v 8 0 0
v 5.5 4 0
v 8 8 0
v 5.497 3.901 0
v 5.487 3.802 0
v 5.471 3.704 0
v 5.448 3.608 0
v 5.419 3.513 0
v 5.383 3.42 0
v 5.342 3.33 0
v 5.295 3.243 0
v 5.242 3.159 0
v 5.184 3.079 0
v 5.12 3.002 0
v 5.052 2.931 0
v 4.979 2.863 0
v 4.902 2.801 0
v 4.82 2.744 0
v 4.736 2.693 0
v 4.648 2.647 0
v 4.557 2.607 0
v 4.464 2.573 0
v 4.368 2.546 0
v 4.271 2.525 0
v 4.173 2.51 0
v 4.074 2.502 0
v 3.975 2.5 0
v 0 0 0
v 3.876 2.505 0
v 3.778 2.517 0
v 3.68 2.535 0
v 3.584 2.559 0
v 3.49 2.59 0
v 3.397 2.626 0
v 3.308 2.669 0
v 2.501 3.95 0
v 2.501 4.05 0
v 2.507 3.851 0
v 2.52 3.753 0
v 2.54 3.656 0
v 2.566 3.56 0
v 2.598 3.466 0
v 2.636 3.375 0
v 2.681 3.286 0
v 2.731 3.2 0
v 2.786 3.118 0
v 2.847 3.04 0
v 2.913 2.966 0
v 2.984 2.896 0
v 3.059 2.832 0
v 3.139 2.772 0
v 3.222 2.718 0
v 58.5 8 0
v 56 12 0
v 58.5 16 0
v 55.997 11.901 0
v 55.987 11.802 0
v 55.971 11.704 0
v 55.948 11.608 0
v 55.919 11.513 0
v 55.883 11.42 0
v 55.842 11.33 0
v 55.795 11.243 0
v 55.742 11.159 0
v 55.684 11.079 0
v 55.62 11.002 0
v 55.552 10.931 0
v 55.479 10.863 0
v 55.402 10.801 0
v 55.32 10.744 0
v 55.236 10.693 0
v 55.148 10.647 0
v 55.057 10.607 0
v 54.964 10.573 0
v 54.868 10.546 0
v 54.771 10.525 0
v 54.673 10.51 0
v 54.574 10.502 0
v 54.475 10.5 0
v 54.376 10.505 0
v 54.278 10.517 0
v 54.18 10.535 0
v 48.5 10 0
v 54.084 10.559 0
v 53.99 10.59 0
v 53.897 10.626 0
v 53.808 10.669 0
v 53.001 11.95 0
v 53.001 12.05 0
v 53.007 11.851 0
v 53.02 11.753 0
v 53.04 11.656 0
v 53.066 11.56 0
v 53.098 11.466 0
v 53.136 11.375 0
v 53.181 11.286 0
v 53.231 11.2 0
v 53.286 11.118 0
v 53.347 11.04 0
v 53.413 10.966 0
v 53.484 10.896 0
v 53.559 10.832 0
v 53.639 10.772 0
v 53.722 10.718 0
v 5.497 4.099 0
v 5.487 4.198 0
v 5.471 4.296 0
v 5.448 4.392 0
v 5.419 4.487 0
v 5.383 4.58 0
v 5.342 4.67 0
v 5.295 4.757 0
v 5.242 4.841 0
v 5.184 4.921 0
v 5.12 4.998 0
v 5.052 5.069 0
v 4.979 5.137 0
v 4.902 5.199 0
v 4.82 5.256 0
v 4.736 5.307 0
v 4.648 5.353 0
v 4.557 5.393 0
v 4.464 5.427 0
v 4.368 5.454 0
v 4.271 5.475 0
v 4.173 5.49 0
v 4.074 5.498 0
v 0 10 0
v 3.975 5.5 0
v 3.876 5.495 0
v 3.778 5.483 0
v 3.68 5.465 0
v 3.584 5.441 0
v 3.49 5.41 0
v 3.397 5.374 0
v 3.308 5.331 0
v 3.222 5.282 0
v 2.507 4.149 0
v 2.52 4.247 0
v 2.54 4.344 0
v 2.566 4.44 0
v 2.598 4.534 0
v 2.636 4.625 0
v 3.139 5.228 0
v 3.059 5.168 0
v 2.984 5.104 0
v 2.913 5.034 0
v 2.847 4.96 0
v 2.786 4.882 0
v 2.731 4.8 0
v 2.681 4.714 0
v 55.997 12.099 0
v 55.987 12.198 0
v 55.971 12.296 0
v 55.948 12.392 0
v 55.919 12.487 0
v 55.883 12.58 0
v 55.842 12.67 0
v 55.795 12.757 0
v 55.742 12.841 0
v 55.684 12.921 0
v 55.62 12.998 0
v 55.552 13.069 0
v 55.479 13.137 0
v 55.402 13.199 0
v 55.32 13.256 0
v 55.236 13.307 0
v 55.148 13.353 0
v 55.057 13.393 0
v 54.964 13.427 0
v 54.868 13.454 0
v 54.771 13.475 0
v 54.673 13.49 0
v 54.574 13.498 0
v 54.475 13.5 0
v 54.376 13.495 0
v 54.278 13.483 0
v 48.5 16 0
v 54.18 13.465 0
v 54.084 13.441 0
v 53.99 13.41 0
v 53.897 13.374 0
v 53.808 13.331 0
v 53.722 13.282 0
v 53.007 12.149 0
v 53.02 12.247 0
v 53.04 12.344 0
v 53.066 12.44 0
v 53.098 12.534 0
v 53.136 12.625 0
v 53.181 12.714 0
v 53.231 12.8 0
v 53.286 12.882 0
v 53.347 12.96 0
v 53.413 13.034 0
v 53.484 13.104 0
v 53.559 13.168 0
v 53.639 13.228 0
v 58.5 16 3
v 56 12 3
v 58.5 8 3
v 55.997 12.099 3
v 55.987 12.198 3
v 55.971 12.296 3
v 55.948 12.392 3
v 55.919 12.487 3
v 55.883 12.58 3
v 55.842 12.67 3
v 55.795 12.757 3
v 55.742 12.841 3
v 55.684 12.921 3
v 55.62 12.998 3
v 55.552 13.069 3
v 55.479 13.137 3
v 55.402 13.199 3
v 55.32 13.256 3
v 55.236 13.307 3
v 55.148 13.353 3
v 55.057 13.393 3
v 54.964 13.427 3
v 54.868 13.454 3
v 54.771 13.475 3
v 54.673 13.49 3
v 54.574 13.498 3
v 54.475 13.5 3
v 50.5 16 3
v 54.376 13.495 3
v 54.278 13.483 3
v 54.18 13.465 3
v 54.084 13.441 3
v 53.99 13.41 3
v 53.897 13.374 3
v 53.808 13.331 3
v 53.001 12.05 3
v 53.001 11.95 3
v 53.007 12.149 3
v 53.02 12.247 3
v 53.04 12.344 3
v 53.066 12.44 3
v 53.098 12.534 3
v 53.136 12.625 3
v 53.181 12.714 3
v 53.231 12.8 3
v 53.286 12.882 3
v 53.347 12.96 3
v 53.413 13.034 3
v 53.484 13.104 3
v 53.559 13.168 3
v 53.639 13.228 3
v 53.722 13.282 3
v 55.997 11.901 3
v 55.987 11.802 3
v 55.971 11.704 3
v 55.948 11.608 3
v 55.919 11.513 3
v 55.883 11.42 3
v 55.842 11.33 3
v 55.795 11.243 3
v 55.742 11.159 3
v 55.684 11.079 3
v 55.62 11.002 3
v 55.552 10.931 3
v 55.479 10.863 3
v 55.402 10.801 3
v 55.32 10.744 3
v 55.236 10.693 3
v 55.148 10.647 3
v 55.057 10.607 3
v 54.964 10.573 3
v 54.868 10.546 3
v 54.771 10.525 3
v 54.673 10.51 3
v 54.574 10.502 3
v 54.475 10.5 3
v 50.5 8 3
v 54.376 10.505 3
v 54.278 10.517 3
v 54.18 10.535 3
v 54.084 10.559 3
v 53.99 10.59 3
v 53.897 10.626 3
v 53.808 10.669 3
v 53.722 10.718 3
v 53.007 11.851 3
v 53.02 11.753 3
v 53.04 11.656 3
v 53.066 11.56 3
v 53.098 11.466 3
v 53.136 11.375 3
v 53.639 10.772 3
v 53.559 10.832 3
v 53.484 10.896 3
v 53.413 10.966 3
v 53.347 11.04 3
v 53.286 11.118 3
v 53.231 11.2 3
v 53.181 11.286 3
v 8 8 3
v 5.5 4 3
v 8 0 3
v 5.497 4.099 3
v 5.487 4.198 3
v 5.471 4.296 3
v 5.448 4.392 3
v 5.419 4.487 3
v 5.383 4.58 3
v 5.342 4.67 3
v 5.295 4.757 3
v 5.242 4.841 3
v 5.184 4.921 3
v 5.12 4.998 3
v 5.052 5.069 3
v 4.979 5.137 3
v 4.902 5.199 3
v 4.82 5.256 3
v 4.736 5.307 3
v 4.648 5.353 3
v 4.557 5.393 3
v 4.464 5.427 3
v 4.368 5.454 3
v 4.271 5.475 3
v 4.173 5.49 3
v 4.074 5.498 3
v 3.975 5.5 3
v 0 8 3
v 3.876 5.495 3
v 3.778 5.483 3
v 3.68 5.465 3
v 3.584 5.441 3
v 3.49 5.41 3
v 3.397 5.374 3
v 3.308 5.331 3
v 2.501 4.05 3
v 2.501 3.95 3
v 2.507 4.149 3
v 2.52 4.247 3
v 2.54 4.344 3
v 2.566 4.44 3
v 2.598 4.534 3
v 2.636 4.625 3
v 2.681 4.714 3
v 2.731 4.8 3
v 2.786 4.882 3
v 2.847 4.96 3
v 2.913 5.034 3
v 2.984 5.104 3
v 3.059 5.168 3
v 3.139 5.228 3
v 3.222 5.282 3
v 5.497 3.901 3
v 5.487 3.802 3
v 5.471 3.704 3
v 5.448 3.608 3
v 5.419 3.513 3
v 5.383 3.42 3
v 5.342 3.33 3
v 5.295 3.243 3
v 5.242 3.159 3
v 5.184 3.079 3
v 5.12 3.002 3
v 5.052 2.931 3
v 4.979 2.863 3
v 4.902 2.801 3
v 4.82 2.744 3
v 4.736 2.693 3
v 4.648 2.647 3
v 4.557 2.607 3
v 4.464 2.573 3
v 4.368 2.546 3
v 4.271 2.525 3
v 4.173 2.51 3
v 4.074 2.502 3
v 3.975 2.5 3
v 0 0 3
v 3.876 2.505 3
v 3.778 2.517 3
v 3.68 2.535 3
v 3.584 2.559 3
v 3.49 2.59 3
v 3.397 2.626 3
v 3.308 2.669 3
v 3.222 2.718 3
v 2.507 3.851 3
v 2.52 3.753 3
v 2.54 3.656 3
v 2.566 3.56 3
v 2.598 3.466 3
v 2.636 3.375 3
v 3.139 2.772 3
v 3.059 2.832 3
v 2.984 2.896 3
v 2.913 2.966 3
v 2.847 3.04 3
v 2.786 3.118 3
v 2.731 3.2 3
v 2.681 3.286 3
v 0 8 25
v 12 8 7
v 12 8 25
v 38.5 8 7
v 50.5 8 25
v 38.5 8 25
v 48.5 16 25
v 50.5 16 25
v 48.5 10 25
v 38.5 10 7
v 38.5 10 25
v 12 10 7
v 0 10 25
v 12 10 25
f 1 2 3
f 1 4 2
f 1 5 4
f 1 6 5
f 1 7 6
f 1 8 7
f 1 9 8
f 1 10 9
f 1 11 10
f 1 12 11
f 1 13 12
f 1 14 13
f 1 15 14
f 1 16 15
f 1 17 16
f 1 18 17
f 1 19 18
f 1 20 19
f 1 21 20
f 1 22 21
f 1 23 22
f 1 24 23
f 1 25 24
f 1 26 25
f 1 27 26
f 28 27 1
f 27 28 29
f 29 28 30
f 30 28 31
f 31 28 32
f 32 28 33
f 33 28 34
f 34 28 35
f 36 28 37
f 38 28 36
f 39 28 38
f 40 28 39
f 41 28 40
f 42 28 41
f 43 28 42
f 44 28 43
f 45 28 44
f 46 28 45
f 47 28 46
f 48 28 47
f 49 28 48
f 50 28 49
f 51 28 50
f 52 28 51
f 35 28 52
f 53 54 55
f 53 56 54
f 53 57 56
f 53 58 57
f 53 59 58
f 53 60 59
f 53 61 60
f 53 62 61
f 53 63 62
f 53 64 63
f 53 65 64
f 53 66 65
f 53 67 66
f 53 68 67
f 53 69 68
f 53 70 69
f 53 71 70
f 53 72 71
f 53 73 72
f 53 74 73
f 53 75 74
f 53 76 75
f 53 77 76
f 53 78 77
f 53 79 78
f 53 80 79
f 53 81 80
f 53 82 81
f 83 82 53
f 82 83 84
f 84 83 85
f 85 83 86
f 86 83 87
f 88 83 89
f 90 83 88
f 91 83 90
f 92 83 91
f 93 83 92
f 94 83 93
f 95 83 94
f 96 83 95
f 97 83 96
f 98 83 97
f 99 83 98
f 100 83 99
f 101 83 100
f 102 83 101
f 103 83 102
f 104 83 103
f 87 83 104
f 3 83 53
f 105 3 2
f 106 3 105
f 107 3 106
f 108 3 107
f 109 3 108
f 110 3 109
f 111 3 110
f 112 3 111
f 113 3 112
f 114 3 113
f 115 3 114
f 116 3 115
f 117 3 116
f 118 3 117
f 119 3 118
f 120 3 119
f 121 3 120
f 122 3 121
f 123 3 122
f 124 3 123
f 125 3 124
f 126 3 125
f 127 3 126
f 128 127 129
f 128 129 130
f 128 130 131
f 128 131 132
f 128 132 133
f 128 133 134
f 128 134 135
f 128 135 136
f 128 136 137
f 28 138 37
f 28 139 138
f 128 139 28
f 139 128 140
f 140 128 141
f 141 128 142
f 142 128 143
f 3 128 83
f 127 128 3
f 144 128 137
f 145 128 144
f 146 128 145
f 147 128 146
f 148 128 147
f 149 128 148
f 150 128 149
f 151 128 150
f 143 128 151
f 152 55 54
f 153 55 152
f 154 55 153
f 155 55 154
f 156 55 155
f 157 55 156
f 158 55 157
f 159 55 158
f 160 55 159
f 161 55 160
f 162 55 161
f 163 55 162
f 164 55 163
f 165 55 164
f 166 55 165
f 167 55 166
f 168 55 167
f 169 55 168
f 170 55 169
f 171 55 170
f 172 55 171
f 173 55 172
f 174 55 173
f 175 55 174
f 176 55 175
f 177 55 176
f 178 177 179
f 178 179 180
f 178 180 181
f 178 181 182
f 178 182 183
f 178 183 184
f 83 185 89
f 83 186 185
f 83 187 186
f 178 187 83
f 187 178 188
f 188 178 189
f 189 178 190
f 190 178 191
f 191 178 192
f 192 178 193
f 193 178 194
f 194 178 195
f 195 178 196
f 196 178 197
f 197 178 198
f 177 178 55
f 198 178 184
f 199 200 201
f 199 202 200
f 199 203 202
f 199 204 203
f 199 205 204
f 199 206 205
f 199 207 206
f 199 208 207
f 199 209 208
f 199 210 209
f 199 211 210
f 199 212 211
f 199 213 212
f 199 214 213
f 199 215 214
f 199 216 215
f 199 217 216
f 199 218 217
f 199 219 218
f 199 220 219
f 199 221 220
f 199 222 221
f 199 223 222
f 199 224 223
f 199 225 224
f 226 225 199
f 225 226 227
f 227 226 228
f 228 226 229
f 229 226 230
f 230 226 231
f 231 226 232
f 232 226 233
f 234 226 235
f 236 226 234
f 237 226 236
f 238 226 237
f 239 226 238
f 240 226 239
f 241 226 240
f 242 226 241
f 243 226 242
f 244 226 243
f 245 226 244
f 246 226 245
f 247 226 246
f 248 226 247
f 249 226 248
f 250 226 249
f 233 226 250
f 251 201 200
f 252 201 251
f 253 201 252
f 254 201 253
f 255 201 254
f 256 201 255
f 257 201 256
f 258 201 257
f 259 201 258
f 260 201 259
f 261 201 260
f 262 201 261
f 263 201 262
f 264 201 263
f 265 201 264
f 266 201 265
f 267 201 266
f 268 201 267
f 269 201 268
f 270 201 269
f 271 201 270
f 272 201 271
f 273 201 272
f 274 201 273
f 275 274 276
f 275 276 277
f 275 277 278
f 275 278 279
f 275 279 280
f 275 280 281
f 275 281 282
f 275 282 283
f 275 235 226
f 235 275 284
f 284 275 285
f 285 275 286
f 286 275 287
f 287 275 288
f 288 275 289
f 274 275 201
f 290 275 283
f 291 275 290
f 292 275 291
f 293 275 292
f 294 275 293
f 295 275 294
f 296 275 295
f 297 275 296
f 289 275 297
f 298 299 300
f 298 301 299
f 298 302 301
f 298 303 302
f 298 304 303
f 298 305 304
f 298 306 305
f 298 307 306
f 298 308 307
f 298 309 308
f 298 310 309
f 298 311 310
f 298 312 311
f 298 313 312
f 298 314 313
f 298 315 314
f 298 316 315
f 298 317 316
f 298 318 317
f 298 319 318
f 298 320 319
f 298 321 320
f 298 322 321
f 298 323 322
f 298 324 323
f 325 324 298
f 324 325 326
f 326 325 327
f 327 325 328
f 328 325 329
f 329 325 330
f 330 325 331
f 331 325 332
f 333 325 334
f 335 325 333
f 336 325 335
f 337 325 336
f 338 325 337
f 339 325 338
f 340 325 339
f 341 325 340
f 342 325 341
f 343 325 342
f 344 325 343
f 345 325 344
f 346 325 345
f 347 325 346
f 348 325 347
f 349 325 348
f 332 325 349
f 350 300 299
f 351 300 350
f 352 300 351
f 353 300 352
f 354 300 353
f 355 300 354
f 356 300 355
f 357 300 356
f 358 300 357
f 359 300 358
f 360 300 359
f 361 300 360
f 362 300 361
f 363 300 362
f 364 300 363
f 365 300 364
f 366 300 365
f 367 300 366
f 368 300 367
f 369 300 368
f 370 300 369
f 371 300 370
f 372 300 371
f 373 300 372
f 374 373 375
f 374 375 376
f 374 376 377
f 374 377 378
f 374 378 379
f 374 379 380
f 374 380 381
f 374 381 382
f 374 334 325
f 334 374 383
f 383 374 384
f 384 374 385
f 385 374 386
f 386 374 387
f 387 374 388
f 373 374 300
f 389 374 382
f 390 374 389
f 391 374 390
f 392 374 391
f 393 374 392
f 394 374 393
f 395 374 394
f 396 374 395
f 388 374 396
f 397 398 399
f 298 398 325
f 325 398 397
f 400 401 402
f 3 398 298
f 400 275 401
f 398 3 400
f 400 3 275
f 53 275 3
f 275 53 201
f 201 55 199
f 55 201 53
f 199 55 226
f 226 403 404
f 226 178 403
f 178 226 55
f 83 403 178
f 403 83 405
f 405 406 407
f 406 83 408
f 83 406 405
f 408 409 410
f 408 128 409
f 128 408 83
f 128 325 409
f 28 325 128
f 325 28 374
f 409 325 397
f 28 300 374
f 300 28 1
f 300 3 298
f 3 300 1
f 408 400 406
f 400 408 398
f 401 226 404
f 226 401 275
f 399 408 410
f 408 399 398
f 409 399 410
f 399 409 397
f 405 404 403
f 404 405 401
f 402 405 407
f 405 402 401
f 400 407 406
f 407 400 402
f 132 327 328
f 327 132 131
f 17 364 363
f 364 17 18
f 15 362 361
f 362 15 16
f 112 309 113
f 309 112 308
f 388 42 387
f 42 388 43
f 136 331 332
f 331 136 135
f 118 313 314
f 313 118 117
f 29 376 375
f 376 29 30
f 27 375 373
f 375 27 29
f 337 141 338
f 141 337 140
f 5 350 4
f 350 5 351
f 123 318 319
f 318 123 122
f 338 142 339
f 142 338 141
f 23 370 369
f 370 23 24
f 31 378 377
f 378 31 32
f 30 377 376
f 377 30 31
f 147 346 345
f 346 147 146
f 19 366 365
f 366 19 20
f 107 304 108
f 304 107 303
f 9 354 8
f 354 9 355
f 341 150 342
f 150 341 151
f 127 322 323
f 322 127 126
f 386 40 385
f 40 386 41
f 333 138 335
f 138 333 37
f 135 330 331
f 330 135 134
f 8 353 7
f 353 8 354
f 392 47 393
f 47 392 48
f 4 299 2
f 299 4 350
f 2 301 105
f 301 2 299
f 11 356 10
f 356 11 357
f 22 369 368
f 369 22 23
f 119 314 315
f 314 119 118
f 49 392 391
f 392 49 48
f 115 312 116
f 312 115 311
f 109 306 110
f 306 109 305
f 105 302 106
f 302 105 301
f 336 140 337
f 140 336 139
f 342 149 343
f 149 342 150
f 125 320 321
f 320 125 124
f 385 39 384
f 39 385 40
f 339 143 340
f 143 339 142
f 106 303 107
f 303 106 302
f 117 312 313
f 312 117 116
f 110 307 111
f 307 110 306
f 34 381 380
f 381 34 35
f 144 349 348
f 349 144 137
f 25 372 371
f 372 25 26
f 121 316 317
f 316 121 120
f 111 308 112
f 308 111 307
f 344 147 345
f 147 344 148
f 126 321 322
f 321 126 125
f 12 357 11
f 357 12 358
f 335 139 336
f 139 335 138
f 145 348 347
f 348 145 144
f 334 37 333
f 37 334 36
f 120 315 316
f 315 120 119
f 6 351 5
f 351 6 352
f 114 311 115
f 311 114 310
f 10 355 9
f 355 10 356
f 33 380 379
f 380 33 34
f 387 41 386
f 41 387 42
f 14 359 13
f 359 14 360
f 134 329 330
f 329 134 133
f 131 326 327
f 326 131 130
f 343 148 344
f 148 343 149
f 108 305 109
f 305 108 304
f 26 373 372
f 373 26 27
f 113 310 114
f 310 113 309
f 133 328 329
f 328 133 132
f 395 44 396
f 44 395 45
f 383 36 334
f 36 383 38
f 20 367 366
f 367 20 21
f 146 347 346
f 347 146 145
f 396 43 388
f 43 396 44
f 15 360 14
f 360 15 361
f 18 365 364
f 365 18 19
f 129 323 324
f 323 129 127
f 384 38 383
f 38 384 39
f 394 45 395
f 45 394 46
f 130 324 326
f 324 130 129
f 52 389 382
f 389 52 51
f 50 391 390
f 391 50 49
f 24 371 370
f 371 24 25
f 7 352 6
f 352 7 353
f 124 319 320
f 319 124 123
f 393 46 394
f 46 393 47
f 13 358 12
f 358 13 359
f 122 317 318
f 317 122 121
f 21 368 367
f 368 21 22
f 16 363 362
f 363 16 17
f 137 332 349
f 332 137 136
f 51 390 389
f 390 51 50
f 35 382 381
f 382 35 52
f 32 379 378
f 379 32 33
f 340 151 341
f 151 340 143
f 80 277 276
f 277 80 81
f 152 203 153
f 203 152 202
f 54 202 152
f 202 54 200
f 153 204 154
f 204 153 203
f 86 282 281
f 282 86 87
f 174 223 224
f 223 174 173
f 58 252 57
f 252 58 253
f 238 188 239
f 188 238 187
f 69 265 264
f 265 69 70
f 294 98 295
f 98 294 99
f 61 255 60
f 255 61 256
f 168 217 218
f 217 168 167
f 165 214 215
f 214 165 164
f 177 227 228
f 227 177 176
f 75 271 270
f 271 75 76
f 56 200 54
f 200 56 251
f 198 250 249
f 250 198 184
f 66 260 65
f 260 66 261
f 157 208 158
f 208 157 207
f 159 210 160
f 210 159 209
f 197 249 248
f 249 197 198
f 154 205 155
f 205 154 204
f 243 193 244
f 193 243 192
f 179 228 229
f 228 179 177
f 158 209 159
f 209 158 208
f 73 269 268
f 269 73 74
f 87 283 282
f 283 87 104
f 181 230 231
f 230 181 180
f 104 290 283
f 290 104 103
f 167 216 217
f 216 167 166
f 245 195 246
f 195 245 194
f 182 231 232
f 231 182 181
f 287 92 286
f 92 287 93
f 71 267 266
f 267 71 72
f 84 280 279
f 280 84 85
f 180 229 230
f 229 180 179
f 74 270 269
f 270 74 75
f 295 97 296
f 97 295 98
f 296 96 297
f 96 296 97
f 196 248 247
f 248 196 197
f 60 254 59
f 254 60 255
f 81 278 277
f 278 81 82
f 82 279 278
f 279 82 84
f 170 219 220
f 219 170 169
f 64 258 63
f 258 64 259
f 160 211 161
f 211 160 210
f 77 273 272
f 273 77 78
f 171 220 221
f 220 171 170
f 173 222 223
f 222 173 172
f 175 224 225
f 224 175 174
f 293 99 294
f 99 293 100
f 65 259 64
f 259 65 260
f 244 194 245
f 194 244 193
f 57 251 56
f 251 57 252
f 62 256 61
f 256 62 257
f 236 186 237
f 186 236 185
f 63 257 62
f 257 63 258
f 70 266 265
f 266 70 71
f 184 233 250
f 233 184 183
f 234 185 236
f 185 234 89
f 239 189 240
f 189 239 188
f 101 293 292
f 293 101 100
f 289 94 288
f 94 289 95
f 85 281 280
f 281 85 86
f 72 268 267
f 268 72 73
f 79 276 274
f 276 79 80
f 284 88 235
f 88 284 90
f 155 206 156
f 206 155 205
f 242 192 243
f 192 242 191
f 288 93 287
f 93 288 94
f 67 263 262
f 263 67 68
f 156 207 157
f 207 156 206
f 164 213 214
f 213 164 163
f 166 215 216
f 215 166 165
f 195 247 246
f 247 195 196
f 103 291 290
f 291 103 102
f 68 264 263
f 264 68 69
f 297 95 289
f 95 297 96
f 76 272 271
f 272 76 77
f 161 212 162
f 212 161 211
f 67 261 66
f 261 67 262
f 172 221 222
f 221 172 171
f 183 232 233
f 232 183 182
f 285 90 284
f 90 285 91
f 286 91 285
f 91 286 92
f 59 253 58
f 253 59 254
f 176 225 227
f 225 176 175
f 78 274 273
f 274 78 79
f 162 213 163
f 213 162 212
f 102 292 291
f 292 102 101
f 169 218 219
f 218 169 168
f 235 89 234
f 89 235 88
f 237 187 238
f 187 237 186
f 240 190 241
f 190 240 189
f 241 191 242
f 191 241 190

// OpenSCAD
$fs=.1;
$fa=.1;

module bracketR() {
	difference() {
		union() {
			linear_extrude(3)
			polygon([
				[   0,  0],
				[   8,  0],
				[   8,  8],
				[58.5,  8],
				[58.5, 16],
				[48.5, 16],
				[48.5, 10],
				[   0, 10],
				[   0,  0]
			]);
			linear_extrude(7)
			polygon([
				[   0,  8],
				[50.5,  8],
				[50.5, 16],
				[48.5, 16],
				[48.5, 10],
				[   0, 10],
				[   0,  8]
			]);
			linear_extrude(25)
			polygon([
				[   0,  8],
				[  12,  8],
				[  12, 10],
				[   0, 10],
				[   0,  8]
			]);
			linear_extrude(25)
			polygon([
				[38.5,  8],
				[50.5,  8],
				[50.5, 16],
				[48.5, 16],
				[48.5, 10],
				[38.5, 10],
				[38.5,  8]
			]);
		}
		translate([4,4,-1])
		cylinder(5,1.5,1.5);
		translate([54.5,12,-1])
		cylinder(5,1.5,1.5);
	}
}

module bracketL() {
	mirror([1,0,0])
	bracketR();
}

//translate([-5,0,0])  bracketL();
//translate([+5,0,0]) bracketR();

//bracketL();
bracketR();
